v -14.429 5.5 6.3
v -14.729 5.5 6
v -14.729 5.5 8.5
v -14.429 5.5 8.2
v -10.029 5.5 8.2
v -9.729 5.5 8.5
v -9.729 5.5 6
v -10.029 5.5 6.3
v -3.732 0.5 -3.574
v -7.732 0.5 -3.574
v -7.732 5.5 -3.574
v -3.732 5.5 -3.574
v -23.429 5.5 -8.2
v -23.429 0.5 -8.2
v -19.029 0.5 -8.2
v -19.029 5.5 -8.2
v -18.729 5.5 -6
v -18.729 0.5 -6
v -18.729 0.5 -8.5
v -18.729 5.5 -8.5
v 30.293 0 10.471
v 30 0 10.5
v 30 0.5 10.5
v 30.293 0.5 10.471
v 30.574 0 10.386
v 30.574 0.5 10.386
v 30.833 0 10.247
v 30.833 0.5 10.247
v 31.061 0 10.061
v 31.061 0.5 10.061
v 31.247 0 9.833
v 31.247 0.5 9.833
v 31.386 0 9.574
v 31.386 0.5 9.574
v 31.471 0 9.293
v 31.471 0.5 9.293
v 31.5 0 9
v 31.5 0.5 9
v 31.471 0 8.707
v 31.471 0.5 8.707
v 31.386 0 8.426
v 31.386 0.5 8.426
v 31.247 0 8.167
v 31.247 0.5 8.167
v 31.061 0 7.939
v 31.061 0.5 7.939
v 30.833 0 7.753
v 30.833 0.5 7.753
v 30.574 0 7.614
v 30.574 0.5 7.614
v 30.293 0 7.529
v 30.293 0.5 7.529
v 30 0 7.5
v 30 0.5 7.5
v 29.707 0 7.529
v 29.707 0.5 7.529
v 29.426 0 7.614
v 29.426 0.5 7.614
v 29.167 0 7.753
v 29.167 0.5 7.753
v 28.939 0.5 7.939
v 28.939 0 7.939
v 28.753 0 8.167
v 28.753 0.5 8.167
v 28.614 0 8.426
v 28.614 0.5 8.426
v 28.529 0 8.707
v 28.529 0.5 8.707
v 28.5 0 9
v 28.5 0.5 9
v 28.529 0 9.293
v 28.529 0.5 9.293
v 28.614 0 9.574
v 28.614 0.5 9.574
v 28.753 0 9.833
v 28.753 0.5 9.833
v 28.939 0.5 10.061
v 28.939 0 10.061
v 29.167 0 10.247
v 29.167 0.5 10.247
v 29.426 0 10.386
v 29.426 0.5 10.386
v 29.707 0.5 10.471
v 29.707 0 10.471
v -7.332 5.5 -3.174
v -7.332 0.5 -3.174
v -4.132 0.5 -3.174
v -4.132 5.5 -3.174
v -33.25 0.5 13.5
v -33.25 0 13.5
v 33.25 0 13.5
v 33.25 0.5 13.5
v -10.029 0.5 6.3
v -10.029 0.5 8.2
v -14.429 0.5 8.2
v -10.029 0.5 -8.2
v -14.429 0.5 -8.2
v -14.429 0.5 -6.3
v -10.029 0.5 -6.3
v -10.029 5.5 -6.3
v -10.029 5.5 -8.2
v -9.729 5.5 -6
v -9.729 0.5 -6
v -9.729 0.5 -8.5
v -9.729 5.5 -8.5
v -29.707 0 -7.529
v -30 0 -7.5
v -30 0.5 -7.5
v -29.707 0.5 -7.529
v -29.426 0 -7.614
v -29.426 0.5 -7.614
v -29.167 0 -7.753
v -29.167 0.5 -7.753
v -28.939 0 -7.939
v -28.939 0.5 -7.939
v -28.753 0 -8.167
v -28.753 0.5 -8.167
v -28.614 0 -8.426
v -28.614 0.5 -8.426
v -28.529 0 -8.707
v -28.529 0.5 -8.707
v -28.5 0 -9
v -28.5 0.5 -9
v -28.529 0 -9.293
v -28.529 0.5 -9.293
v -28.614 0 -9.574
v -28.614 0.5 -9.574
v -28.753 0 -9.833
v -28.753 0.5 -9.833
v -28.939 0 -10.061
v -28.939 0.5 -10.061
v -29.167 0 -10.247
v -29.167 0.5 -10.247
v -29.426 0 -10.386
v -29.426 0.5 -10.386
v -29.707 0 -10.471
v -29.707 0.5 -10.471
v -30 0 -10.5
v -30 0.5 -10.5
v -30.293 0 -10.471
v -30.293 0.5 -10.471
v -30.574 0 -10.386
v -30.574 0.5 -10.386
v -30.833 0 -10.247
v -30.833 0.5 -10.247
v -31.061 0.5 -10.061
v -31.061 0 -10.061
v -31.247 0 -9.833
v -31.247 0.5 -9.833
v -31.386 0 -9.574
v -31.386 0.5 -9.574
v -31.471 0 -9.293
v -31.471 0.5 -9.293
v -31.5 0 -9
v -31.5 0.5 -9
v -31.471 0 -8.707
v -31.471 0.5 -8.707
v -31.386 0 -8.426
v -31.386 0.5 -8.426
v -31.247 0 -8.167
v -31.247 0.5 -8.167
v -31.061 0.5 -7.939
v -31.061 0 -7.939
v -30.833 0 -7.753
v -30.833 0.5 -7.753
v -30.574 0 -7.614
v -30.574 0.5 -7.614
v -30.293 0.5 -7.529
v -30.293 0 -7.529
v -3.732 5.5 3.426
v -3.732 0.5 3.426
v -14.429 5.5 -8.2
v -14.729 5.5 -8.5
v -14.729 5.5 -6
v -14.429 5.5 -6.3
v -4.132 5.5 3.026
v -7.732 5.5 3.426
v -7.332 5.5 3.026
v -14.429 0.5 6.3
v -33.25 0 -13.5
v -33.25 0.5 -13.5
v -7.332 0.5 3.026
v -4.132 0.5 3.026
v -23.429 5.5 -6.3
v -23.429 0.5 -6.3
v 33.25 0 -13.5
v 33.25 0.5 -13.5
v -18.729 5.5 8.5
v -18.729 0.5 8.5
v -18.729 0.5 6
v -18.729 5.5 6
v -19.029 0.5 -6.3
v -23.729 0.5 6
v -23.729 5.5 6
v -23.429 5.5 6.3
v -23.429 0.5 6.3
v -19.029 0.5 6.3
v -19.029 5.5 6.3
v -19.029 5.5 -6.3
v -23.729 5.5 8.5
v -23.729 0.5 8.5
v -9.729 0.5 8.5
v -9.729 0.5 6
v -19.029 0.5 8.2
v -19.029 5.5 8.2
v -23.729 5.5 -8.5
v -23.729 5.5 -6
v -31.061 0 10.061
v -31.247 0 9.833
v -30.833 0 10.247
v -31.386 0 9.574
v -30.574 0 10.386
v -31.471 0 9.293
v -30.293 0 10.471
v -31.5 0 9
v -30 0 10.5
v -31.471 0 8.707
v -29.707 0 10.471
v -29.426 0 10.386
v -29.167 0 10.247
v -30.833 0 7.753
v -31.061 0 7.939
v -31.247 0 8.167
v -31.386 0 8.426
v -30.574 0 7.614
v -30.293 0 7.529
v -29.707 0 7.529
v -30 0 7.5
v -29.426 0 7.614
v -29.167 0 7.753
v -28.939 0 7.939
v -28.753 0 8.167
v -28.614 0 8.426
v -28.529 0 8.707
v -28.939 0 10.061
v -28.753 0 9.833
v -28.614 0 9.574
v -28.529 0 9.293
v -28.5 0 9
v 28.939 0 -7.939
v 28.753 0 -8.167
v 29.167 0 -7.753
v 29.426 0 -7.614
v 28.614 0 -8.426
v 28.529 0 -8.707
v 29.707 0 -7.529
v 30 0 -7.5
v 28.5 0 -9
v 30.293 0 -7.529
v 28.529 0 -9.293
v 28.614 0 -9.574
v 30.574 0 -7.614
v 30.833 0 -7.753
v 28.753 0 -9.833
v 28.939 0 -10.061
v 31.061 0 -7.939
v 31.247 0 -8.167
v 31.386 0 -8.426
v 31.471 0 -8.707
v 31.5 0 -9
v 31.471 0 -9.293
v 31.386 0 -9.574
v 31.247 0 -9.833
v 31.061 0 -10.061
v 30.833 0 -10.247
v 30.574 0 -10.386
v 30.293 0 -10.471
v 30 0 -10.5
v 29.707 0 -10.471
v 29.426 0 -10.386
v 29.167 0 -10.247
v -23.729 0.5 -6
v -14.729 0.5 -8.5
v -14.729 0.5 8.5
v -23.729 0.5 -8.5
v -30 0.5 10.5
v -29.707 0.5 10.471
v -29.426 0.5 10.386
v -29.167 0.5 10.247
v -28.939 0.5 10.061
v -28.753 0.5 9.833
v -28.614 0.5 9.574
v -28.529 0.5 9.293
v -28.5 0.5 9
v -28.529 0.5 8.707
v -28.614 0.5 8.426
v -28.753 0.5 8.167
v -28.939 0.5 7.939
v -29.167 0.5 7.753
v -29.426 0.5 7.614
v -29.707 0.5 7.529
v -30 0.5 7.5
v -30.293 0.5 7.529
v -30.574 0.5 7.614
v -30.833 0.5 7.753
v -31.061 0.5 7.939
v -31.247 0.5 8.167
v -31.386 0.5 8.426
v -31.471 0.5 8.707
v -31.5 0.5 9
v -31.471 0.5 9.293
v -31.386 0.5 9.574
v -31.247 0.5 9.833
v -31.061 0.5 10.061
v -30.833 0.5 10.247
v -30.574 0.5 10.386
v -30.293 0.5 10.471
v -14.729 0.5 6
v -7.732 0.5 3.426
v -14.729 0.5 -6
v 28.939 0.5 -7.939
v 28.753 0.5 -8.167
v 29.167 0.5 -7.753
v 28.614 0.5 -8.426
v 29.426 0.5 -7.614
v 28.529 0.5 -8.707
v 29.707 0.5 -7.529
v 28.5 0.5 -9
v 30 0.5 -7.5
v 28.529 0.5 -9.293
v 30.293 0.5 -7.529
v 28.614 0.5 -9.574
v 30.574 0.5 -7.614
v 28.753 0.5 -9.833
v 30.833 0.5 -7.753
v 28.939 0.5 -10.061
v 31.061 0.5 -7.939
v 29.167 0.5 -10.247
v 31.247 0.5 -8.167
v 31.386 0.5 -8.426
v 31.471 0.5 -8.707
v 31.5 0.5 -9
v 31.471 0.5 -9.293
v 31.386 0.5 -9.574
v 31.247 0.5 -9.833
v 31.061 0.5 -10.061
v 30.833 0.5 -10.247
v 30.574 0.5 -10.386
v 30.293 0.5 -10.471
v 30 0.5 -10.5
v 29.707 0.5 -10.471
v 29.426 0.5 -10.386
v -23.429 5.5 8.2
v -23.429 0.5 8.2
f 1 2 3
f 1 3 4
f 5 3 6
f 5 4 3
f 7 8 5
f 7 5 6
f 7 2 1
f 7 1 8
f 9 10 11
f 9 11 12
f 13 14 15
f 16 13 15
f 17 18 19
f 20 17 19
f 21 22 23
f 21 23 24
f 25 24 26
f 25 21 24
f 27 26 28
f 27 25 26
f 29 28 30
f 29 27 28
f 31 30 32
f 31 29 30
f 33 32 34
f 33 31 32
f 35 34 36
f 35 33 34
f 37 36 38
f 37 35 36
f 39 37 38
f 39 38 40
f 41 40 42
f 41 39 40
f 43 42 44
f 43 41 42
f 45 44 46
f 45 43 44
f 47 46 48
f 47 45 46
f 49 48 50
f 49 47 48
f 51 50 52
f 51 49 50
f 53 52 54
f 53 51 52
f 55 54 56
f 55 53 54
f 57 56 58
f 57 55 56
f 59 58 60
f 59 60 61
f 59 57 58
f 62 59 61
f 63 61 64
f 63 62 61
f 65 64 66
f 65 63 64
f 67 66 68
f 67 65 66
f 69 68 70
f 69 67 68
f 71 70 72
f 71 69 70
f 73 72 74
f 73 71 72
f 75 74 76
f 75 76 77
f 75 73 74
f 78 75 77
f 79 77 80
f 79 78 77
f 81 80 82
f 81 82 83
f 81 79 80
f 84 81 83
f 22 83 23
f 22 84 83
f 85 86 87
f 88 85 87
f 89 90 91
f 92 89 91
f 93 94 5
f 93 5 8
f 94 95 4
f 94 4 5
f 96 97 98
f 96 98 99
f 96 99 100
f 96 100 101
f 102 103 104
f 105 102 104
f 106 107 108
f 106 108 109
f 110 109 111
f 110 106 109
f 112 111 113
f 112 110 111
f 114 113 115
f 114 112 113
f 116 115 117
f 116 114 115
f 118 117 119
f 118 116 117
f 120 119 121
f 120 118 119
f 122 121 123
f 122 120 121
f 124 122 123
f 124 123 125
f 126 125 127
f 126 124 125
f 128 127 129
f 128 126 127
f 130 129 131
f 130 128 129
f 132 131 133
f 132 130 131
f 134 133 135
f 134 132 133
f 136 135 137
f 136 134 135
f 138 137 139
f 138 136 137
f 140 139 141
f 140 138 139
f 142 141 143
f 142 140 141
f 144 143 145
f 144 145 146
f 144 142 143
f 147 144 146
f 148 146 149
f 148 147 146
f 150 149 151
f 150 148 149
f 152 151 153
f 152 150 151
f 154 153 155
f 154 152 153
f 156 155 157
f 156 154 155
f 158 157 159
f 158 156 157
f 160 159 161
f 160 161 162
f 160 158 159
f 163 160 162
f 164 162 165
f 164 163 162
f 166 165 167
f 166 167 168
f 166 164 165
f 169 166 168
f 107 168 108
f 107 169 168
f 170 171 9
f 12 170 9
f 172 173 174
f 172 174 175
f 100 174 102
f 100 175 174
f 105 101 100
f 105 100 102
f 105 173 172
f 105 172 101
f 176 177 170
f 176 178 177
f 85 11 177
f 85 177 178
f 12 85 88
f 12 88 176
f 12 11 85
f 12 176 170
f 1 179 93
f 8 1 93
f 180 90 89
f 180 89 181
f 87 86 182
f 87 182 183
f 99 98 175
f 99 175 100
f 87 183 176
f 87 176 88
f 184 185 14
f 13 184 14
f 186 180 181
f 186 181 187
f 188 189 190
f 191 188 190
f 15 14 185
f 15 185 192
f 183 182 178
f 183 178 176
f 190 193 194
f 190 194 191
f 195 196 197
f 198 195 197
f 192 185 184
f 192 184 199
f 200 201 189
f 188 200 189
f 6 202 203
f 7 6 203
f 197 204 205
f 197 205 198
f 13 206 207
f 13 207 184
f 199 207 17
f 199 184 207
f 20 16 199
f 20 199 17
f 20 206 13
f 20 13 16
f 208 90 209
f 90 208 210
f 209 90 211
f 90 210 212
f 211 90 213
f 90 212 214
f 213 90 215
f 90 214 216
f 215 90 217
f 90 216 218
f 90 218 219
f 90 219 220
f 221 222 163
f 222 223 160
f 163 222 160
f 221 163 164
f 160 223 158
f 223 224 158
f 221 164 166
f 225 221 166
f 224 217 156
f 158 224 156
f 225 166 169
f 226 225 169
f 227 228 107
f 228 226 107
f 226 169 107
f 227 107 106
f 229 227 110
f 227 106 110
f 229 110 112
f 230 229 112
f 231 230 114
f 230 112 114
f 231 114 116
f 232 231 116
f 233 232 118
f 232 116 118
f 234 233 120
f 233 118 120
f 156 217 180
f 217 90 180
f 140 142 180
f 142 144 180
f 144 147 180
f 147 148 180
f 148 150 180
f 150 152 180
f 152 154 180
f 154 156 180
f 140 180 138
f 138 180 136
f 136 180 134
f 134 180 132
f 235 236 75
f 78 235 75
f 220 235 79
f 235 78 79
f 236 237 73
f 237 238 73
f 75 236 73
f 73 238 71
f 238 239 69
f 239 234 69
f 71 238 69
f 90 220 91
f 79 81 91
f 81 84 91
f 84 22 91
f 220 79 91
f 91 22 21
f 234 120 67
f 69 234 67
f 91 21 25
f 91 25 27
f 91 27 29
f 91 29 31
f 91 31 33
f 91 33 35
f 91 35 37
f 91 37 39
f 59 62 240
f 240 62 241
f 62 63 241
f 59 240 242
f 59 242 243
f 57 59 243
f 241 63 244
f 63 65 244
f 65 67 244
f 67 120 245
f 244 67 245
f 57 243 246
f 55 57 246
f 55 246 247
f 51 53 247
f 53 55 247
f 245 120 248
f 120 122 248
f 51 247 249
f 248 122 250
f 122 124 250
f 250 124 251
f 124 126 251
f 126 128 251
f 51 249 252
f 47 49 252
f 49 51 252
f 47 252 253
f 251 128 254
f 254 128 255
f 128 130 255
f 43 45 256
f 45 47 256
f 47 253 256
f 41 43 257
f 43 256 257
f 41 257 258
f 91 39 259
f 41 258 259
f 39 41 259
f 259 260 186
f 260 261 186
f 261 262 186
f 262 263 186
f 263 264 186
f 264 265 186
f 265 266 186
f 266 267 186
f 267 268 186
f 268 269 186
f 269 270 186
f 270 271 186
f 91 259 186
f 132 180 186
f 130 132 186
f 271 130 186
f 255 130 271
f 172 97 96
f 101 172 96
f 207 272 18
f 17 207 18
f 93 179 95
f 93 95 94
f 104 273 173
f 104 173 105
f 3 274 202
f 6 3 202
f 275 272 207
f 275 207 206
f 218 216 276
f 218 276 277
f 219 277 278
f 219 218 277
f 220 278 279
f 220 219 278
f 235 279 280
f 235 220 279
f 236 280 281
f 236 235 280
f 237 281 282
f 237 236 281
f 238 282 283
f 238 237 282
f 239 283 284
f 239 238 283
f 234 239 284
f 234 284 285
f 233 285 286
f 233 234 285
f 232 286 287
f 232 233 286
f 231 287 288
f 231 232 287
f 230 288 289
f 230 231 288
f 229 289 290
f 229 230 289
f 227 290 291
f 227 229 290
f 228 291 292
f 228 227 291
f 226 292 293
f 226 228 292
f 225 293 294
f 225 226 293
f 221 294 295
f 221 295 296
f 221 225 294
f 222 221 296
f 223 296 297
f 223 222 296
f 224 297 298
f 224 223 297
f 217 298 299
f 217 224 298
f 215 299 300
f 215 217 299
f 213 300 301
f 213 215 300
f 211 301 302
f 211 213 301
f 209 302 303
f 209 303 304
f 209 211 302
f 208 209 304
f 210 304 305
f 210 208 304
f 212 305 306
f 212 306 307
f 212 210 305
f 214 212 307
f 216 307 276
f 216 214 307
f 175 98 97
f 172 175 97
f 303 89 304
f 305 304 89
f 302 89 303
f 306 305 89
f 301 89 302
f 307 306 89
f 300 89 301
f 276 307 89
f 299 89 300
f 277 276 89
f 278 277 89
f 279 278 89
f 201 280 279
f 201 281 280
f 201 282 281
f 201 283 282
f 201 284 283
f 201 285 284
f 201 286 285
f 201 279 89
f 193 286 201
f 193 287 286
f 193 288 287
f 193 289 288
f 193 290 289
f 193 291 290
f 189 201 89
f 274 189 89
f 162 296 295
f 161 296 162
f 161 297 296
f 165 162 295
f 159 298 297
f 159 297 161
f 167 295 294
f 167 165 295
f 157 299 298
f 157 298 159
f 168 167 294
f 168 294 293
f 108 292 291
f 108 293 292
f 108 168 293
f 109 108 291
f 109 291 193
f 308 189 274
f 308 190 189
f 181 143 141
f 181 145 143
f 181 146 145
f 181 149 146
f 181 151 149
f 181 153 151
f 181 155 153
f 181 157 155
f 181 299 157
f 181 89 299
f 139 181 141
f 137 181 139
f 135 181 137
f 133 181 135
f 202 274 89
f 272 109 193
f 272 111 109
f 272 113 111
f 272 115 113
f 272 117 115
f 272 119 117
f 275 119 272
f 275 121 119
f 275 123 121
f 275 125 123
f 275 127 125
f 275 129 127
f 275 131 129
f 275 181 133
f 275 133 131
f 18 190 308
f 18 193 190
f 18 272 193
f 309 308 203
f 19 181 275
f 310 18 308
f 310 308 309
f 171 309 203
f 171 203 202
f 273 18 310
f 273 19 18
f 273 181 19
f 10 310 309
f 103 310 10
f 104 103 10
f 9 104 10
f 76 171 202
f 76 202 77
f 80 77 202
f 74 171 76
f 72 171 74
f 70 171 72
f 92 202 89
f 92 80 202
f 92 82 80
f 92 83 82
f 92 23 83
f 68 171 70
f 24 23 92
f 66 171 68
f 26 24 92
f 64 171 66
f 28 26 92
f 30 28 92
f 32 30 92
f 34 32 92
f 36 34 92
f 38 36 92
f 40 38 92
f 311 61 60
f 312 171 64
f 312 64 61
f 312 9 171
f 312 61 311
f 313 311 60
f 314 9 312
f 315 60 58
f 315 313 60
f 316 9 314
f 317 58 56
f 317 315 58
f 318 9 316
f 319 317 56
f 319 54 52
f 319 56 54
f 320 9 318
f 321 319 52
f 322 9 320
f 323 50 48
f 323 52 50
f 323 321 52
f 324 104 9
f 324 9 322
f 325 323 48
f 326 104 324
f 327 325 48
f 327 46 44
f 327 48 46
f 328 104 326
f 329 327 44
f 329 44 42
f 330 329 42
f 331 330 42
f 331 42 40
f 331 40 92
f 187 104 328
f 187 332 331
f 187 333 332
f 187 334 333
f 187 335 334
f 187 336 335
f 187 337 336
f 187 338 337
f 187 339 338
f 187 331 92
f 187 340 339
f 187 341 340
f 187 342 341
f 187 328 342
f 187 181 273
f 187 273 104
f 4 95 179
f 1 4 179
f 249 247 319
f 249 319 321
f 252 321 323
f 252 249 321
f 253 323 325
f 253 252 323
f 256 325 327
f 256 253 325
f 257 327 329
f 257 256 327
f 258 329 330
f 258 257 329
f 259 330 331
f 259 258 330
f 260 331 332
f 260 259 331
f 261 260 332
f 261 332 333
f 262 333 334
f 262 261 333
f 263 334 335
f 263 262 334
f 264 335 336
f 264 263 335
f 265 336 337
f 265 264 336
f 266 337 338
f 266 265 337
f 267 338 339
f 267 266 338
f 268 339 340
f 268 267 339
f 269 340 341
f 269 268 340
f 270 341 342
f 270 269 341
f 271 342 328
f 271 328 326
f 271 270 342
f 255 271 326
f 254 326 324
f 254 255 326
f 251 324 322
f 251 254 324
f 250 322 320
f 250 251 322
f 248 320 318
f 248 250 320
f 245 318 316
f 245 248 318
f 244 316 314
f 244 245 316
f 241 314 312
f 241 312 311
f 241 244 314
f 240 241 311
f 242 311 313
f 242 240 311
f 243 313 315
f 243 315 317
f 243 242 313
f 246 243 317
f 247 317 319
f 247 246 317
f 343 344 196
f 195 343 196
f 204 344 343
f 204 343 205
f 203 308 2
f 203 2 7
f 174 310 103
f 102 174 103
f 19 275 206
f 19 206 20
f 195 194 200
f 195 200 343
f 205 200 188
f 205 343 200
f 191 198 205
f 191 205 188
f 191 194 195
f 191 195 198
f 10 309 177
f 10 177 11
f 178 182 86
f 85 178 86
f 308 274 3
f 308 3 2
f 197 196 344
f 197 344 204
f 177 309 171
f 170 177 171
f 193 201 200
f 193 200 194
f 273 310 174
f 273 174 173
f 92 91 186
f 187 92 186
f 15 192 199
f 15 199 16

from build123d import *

# Parameters (mm, degrees)
SKETCH1_W           = 66.5
SKETCH1_H           = 27
SKETCH1_R           = 1.5
BOSS_EXTRUDE1_DEPTH = 0.5
SKETCH2_W           = 5
SKETCH2_H           = 2.5
SKETCH2_W_2         = 4.4
SKETCH2_H_2         = 1.9
BOSS_EXTRUDE2_DEPTH = 5
SKETCH4_W           = 4
SKETCH4_H           = 7
SKETCH4_W_2         = 3.2
SKETCH4_H_2         = 6.2
BOSS_EXTRUDE3_DEPTH = 5


with BuildPart() as part:
    # Sketch1 → Boss-Extrude1 (new body)
    with BuildSketch(Plane(origin=(0, 0, 0), x_dir=(1, 0, 0), z_dir=(0, 1, 0))):
        Rectangle(SKETCH1_W, SKETCH1_H)
        with Locations(Location((-30, 9, 0), (0, 0, 270))):
            Circle(SKETCH1_R, mode=Mode.SUBTRACT)
        with Locations(Location((-30, -9, 0), (0, 0, 270))):
            Circle(SKETCH1_R, mode=Mode.SUBTRACT)
        with Locations(Location((30, 9, 0), (0, 0, 270))):
            Circle(SKETCH1_R, mode=Mode.SUBTRACT)
        with Locations(Location((30, -9, 0), (0, 0, 270))):
            Circle(SKETCH1_R, mode=Mode.SUBTRACT)
    extrude(amount=BOSS_EXTRUDE1_DEPTH)

    # Sketch2 → Boss-Extrude2 (add)
    # profile 1 of 4: a face of its own
    with BuildSketch(Plane(origin=(0, 0.5, 0), x_dir=(1, 0, 0), z_dir=(0, 1, 0))):
        with Locations((-21.228920611, 7.25)):
            Rectangle(SKETCH2_W, SKETCH2_H)
        with Locations((-21.228920611, 7.25)):
            Rectangle(SKETCH2_W_2, SKETCH2_H_2, mode=Mode.SUBTRACT)
    # profile 2 of 4: a face of its own
    with BuildSketch(Plane(origin=(0, 0.5, 0), x_dir=(1, 0, 0), z_dir=(0, 1, 0))):
        with Locations((-12.228920611, 7.25)):
            Rectangle(SKETCH2_W, SKETCH2_H)
        with Locations((-12.228920611, 7.25)):
            Rectangle(SKETCH2_W_2, SKETCH2_H_2, mode=Mode.SUBTRACT)
    # profile 3 of 4: a face of its own
    with BuildSketch(Plane(origin=(0, 0.5, 0), x_dir=(1, 0, 0), z_dir=(0, 1, 0))):
        with Locations((-12.228920611, -7.25)):
            Rectangle(SKETCH2_W, SKETCH2_H)
        with Locations((-12.228920611, -7.25)):
            Rectangle(SKETCH2_W_2, SKETCH2_H_2, mode=Mode.SUBTRACT)
    # profile 4 of 4: a face of its own
    with BuildSketch(Plane(origin=(0, 0.5, 0), x_dir=(1, 0, 0), z_dir=(0, 1, 0))):
        with Locations((-21.228920611, -7.25)):
            Rectangle(SKETCH2_W, SKETCH2_H)
        with Locations((-21.228920611, -7.25)):
            Rectangle(SKETCH2_W_2, SKETCH2_H_2, mode=Mode.SUBTRACT)
    extrude(amount=BOSS_EXTRUDE2_DEPTH)

    # Sketch4 → Boss-Extrude3 (add)
    with BuildSketch(Plane(origin=(0, 0.5, 0), x_dir=(1, 0, 0), z_dir=(0, 1, 0))):
        with Locations((-5.732400649, 0.074372007)):
            Rectangle(SKETCH4_W, SKETCH4_H)
        with Locations((-5.732400649, 0.074372007)):
            Rectangle(SKETCH4_W_2, SKETCH4_H_2, mode=Mode.SUBTRACT)
    extrude(amount=BOSS_EXTRUDE3_DEPTH)


solid = part.part
